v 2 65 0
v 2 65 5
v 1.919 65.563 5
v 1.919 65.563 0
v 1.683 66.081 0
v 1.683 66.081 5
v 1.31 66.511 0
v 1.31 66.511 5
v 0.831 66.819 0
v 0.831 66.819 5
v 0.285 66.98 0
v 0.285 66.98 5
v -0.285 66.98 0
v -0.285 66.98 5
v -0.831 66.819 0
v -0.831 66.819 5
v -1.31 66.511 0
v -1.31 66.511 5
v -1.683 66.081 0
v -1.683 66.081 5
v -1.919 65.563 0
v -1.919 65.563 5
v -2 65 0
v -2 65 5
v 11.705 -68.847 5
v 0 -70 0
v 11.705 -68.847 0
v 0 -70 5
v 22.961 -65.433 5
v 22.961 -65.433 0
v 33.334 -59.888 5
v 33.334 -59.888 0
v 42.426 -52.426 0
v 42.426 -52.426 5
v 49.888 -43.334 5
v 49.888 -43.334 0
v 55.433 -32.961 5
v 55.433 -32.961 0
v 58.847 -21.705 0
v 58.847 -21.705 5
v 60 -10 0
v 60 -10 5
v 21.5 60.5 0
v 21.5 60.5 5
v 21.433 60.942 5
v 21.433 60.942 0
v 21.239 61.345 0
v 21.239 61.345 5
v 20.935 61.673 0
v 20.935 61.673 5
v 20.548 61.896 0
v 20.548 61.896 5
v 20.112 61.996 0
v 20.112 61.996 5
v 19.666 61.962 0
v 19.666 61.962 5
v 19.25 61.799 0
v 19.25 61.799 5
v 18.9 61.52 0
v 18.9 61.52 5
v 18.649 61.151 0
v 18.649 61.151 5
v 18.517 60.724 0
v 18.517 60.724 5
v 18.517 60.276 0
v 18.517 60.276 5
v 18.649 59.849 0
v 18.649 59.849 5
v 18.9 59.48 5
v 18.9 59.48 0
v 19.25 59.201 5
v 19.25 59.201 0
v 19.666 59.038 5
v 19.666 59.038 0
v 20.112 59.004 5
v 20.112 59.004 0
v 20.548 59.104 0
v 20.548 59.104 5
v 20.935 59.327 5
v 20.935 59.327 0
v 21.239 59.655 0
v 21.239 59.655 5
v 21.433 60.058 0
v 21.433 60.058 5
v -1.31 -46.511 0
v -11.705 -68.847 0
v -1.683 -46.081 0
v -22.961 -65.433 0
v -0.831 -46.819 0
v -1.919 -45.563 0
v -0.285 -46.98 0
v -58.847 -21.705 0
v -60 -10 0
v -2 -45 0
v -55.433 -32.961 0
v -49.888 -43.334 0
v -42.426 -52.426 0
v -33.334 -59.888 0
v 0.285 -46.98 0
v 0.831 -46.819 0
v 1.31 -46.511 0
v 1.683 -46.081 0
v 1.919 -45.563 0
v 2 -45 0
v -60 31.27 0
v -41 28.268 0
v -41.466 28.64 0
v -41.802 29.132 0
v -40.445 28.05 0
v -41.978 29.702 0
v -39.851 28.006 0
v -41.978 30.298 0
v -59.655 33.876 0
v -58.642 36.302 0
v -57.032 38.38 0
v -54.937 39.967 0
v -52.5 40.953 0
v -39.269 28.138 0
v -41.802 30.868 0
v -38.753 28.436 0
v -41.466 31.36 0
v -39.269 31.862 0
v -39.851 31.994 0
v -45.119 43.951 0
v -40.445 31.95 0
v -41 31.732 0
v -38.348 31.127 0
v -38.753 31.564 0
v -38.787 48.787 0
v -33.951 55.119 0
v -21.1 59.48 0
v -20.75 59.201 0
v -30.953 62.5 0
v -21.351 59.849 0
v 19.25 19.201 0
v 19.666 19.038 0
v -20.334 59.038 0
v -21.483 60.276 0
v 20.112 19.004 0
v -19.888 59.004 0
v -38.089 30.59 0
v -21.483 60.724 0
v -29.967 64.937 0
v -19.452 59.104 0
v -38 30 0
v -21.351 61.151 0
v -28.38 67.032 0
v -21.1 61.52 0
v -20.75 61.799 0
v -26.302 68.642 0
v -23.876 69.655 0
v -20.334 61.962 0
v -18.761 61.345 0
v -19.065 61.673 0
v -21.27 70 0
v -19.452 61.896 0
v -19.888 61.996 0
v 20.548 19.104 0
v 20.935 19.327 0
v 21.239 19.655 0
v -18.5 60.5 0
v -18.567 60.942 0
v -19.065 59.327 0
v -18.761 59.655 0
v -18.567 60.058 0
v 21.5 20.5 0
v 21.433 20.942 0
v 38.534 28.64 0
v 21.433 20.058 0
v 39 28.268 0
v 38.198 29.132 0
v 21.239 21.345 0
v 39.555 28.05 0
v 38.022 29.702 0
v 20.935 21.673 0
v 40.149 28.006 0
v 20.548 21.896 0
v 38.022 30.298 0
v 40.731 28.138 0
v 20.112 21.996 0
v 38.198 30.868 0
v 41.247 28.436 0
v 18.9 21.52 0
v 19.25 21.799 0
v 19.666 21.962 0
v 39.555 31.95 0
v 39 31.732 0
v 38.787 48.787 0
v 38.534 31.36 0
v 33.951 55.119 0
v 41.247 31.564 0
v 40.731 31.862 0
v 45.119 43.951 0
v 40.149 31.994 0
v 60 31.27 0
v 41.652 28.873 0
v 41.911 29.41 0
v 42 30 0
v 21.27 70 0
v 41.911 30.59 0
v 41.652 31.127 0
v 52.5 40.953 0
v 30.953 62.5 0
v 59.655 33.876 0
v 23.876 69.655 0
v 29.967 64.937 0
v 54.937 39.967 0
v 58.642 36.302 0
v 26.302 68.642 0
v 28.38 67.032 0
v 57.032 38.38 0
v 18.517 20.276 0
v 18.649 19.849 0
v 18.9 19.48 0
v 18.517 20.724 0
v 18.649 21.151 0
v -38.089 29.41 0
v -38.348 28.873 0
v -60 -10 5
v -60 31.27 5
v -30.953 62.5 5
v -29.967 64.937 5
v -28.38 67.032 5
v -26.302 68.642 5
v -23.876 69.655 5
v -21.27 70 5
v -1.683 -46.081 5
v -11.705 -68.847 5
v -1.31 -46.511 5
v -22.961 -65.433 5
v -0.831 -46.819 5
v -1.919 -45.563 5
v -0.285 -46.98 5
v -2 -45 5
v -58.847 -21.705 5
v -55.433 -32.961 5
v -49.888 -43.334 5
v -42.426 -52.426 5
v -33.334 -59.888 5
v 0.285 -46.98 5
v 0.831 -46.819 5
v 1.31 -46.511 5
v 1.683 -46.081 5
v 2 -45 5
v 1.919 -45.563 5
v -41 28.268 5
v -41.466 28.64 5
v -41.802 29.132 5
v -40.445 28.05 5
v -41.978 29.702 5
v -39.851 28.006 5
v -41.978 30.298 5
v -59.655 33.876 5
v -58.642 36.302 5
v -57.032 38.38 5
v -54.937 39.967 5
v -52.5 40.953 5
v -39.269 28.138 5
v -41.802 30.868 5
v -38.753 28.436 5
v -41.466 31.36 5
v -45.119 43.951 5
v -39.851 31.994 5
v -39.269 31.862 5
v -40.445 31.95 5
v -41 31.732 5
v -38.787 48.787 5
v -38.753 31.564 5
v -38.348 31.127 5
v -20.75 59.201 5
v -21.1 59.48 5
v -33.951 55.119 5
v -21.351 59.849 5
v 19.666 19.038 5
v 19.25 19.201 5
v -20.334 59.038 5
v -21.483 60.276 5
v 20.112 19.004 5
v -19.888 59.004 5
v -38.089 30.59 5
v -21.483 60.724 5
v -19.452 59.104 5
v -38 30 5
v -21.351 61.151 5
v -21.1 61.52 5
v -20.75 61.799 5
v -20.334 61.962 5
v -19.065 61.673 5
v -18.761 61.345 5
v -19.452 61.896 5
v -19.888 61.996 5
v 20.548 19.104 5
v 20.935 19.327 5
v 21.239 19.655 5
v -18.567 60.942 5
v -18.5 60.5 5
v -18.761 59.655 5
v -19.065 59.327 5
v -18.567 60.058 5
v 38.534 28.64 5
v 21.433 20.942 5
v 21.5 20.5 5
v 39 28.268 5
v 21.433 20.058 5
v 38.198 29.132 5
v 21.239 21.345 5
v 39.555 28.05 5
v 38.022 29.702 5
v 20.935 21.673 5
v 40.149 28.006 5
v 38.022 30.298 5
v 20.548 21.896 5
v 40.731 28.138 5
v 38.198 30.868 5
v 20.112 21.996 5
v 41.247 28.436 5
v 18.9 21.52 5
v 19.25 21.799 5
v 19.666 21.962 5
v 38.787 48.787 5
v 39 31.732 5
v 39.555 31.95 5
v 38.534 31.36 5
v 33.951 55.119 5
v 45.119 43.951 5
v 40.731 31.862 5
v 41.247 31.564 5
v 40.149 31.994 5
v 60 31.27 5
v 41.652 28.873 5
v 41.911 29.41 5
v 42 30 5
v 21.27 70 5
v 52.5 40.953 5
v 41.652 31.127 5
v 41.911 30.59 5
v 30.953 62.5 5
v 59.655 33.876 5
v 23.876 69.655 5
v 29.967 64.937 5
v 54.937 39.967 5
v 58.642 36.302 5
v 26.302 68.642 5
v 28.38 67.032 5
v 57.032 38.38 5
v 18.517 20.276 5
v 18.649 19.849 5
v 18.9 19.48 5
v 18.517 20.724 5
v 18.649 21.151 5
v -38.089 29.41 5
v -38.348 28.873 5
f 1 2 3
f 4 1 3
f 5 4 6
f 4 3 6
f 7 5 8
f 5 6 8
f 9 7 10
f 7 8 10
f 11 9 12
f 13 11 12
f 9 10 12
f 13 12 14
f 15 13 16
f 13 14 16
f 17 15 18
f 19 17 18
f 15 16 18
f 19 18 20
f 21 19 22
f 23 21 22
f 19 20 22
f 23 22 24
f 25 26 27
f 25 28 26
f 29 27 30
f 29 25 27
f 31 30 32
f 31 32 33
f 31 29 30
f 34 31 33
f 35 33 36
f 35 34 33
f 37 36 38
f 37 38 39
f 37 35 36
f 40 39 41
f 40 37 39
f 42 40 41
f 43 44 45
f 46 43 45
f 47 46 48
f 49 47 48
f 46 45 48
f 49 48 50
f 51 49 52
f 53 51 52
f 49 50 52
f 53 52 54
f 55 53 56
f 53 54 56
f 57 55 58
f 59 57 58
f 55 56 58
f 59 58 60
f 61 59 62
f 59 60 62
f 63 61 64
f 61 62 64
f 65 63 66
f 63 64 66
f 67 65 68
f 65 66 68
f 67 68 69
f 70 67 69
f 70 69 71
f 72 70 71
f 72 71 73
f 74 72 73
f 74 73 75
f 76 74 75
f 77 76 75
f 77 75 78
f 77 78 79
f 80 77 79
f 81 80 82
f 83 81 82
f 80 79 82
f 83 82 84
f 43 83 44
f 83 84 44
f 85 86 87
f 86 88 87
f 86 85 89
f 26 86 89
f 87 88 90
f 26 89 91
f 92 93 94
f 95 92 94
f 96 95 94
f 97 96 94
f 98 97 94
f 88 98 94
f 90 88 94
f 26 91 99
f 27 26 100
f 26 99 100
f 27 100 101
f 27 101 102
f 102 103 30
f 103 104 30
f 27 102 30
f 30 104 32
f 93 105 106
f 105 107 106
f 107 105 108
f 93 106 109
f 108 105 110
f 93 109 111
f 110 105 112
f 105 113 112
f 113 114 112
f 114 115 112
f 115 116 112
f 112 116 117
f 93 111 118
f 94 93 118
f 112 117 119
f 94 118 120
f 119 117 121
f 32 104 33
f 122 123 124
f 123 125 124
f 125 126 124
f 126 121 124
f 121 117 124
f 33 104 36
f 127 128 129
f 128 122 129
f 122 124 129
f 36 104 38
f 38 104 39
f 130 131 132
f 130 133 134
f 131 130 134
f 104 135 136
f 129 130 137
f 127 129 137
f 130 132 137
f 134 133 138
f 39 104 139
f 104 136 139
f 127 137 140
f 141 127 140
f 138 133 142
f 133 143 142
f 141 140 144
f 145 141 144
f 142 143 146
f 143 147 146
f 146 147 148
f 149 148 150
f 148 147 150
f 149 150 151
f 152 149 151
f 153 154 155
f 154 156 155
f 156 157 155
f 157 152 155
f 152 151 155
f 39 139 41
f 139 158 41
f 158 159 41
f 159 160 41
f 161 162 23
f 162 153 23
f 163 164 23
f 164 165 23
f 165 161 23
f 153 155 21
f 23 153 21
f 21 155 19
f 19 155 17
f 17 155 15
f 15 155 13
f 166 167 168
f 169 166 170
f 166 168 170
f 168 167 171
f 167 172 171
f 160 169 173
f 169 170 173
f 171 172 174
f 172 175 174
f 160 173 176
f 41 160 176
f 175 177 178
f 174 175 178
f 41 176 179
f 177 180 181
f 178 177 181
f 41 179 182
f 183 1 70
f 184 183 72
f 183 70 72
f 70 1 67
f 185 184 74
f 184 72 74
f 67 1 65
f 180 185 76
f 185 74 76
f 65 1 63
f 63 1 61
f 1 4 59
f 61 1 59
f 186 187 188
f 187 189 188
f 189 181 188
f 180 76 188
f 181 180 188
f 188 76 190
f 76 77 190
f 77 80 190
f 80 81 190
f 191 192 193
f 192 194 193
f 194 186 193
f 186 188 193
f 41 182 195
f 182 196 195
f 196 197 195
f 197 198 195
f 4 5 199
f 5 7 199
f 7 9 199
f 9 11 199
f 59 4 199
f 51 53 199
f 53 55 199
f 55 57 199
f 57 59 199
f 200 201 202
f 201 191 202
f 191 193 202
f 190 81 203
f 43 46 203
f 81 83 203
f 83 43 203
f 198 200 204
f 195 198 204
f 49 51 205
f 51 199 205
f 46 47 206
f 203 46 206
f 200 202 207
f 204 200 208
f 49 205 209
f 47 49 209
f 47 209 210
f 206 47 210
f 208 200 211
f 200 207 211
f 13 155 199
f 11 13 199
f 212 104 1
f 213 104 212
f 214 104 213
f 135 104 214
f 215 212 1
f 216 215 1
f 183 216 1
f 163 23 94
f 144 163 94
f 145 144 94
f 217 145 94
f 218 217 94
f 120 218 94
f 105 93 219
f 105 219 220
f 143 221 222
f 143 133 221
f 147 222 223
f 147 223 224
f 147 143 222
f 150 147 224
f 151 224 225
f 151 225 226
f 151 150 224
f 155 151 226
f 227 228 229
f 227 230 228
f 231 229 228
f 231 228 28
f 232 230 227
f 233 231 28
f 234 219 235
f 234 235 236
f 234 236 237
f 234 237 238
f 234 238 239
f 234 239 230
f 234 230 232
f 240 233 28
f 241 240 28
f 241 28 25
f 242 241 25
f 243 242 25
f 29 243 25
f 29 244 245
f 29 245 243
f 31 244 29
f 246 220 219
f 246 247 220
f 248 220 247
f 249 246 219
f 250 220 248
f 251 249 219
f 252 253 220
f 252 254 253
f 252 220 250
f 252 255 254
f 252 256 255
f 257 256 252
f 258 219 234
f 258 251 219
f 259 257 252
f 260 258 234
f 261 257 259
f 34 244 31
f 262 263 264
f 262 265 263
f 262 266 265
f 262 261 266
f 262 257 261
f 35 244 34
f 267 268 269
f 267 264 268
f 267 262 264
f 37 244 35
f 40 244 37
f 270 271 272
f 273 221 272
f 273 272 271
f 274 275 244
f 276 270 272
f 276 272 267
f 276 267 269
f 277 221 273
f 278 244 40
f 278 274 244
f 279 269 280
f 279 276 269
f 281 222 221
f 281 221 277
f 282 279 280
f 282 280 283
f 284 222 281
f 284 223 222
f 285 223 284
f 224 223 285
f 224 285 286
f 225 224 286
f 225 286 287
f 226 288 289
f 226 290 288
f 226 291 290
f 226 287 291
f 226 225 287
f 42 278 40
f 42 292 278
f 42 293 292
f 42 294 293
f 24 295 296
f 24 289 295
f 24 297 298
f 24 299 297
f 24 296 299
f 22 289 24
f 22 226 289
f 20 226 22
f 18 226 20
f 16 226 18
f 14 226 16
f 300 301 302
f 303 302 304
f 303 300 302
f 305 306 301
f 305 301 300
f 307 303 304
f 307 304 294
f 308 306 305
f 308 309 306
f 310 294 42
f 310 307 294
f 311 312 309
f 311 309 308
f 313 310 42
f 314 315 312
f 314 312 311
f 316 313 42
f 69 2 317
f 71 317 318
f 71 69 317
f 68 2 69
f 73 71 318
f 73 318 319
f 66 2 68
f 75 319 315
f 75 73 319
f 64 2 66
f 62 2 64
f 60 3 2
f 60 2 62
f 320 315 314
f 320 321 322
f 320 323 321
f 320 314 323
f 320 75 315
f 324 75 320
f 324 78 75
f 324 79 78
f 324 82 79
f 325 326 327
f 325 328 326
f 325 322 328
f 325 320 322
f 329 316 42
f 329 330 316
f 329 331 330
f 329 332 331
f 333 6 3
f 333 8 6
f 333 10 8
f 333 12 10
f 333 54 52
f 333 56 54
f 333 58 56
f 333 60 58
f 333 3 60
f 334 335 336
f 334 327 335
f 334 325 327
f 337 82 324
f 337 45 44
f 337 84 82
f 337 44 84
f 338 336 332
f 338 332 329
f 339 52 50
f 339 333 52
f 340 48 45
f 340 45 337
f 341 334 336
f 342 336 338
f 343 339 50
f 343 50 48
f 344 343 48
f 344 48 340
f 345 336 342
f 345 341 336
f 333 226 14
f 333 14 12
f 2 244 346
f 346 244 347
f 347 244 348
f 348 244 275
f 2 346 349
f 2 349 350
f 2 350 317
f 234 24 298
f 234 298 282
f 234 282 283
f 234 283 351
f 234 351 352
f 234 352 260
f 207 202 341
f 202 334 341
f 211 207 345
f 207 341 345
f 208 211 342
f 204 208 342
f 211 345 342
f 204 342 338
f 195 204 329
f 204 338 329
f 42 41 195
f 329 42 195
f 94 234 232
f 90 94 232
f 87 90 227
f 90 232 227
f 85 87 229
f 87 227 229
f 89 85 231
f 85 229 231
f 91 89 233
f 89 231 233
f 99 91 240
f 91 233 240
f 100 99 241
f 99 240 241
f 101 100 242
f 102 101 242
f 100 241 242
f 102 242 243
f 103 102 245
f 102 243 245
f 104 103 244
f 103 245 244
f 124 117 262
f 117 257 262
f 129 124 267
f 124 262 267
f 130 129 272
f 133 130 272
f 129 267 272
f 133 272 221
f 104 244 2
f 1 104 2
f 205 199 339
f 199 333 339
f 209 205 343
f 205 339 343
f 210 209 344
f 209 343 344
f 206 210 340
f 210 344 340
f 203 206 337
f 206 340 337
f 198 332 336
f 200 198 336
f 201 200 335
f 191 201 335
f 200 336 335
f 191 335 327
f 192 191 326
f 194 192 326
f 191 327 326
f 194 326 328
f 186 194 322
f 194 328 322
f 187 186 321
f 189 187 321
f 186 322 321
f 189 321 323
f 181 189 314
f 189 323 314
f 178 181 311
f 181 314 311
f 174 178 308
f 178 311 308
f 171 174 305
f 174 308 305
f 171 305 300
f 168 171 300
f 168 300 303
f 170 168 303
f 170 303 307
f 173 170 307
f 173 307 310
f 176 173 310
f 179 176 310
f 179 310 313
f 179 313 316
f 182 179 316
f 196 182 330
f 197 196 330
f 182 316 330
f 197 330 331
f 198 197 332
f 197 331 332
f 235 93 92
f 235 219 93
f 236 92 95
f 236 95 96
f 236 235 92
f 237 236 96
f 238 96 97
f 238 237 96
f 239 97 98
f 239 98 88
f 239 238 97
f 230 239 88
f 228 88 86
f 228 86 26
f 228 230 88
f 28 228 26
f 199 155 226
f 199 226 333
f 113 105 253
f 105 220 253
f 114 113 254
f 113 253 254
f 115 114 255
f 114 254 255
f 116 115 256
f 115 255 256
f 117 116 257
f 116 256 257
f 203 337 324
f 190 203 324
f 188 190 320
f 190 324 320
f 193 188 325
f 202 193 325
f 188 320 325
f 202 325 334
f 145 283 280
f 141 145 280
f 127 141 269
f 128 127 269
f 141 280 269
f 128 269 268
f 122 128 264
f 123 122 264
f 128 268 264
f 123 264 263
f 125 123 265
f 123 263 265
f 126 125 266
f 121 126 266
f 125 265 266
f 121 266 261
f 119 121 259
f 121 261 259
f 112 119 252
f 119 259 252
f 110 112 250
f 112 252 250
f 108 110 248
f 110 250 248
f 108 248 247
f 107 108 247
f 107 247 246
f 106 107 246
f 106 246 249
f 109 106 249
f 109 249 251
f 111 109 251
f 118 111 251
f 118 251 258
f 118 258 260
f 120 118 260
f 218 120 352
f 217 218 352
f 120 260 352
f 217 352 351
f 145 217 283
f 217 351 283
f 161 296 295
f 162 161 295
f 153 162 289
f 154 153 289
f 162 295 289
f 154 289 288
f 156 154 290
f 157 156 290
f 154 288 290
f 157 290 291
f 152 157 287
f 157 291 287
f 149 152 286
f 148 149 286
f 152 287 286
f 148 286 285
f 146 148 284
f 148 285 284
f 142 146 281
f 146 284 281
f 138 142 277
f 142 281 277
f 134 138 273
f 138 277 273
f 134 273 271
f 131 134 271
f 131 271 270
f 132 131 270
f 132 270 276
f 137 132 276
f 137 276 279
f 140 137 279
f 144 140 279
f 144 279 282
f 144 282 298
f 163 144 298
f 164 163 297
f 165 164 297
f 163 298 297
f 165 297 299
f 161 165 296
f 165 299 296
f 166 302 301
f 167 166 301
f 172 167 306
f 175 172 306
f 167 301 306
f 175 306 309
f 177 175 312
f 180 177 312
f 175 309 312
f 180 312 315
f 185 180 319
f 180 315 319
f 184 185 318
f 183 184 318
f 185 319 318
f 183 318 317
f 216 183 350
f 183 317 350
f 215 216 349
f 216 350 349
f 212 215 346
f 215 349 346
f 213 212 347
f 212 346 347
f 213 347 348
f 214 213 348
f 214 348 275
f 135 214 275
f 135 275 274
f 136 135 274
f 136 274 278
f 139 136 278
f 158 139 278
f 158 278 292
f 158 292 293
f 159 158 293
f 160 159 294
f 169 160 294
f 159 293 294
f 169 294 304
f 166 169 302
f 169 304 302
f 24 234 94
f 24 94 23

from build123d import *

# Parameters (mm, degrees)
CROQUIS1_W              = 120
CROQUIS1_H              = 140
SALIENTE_EXTRUIR1_DEPTH = 5
CROQUIS2_R              = 2
CROQUIS2_R_2            = 1.5
CORTAR_EXTRUIR1_DEPTH   = 5
CROQUIS3_W              = 4
CROQUIS3_H              = 110.000000561
CORTAR_EXTRUIR2_DEPTH   = 5
CROQUIS5_R              = 30
CORTAR_EXTRUIR3_DEPTH   = 5
REDONDEO2_R             = 10
REDONDEO3_R             = 60


with BuildPart() as part:
    # Croquis1 → Saliente-Extruir1 (new body)
    with BuildSketch(Plane.XY):
        Rectangle(CROQUIS1_W, CROQUIS1_H)
    extrude(amount=SALIENTE_EXTRUIR1_DEPTH)

    # Croquis2 → Cortar-Extruir1 (cut)
    with BuildSketch(Plane.XY.offset(5)):
        with Locations((-40, 30)):
            Circle(CROQUIS2_R)
        with Locations((40, 30)):
            Circle(CROQUIS2_R)
        with Locations((0, 65)):
            Circle(CROQUIS2_R)
        with Locations((0, -45)):
            Circle(CROQUIS2_R)
        with Locations((-20, 60.5)):
            Circle(CROQUIS2_R_2)
        with Locations((20, 60.5)):
            Circle(CROQUIS2_R_2)
        with Locations((20, 20.5)):
            Circle(CROQUIS2_R_2)
    extrude(amount=-CORTAR_EXTRUIR1_DEPTH, mode=Mode.SUBTRACT)

    # Croquis3 → Cortar-Extruir2 (cut)
    with BuildSketch(Plane.XY.offset(5)):
        with Locations((0, 9.999999746)):
            Rectangle(CROQUIS3_W, CROQUIS3_H)
    extrude(amount=-CORTAR_EXTRUIR2_DEPTH, mode=Mode.SUBTRACT)

    # Croquis5 → Cortar-Extruir3 (cut)
    with BuildSketch(Plane.XY.offset(5)):
        with Locations((-60, 70)):
            Circle(CROQUIS5_R)
        with Locations((60, 70)):
            Circle(CROQUIS5_R)
    extrude(amount=-CORTAR_EXTRUIR3_DEPTH, mode=Mode.SUBTRACT)

    # Redondeo2
    redondeo2_edges = [part.edges().sort_by_distance(p)[0] for p in [
        (-30, 70, 2.5),
        (-60, 40, 2.5),
        (60, 40, 2.5),
        (30, 70, 2.5),
    ]]
    fillet(redondeo2_edges, radius=REDONDEO2_R)

    # Redondeo3
    redondeo3_edges = [part.edges().sort_by_distance(p)[0] for p in [
        (60, -70, 2.5),
        (-60, -70, 2.5),
    ]]
    fillet(redondeo3_edges, radius=REDONDEO3_R - 0.0001)  # a hair under: the kernel refuses the full size


solid = part.part
